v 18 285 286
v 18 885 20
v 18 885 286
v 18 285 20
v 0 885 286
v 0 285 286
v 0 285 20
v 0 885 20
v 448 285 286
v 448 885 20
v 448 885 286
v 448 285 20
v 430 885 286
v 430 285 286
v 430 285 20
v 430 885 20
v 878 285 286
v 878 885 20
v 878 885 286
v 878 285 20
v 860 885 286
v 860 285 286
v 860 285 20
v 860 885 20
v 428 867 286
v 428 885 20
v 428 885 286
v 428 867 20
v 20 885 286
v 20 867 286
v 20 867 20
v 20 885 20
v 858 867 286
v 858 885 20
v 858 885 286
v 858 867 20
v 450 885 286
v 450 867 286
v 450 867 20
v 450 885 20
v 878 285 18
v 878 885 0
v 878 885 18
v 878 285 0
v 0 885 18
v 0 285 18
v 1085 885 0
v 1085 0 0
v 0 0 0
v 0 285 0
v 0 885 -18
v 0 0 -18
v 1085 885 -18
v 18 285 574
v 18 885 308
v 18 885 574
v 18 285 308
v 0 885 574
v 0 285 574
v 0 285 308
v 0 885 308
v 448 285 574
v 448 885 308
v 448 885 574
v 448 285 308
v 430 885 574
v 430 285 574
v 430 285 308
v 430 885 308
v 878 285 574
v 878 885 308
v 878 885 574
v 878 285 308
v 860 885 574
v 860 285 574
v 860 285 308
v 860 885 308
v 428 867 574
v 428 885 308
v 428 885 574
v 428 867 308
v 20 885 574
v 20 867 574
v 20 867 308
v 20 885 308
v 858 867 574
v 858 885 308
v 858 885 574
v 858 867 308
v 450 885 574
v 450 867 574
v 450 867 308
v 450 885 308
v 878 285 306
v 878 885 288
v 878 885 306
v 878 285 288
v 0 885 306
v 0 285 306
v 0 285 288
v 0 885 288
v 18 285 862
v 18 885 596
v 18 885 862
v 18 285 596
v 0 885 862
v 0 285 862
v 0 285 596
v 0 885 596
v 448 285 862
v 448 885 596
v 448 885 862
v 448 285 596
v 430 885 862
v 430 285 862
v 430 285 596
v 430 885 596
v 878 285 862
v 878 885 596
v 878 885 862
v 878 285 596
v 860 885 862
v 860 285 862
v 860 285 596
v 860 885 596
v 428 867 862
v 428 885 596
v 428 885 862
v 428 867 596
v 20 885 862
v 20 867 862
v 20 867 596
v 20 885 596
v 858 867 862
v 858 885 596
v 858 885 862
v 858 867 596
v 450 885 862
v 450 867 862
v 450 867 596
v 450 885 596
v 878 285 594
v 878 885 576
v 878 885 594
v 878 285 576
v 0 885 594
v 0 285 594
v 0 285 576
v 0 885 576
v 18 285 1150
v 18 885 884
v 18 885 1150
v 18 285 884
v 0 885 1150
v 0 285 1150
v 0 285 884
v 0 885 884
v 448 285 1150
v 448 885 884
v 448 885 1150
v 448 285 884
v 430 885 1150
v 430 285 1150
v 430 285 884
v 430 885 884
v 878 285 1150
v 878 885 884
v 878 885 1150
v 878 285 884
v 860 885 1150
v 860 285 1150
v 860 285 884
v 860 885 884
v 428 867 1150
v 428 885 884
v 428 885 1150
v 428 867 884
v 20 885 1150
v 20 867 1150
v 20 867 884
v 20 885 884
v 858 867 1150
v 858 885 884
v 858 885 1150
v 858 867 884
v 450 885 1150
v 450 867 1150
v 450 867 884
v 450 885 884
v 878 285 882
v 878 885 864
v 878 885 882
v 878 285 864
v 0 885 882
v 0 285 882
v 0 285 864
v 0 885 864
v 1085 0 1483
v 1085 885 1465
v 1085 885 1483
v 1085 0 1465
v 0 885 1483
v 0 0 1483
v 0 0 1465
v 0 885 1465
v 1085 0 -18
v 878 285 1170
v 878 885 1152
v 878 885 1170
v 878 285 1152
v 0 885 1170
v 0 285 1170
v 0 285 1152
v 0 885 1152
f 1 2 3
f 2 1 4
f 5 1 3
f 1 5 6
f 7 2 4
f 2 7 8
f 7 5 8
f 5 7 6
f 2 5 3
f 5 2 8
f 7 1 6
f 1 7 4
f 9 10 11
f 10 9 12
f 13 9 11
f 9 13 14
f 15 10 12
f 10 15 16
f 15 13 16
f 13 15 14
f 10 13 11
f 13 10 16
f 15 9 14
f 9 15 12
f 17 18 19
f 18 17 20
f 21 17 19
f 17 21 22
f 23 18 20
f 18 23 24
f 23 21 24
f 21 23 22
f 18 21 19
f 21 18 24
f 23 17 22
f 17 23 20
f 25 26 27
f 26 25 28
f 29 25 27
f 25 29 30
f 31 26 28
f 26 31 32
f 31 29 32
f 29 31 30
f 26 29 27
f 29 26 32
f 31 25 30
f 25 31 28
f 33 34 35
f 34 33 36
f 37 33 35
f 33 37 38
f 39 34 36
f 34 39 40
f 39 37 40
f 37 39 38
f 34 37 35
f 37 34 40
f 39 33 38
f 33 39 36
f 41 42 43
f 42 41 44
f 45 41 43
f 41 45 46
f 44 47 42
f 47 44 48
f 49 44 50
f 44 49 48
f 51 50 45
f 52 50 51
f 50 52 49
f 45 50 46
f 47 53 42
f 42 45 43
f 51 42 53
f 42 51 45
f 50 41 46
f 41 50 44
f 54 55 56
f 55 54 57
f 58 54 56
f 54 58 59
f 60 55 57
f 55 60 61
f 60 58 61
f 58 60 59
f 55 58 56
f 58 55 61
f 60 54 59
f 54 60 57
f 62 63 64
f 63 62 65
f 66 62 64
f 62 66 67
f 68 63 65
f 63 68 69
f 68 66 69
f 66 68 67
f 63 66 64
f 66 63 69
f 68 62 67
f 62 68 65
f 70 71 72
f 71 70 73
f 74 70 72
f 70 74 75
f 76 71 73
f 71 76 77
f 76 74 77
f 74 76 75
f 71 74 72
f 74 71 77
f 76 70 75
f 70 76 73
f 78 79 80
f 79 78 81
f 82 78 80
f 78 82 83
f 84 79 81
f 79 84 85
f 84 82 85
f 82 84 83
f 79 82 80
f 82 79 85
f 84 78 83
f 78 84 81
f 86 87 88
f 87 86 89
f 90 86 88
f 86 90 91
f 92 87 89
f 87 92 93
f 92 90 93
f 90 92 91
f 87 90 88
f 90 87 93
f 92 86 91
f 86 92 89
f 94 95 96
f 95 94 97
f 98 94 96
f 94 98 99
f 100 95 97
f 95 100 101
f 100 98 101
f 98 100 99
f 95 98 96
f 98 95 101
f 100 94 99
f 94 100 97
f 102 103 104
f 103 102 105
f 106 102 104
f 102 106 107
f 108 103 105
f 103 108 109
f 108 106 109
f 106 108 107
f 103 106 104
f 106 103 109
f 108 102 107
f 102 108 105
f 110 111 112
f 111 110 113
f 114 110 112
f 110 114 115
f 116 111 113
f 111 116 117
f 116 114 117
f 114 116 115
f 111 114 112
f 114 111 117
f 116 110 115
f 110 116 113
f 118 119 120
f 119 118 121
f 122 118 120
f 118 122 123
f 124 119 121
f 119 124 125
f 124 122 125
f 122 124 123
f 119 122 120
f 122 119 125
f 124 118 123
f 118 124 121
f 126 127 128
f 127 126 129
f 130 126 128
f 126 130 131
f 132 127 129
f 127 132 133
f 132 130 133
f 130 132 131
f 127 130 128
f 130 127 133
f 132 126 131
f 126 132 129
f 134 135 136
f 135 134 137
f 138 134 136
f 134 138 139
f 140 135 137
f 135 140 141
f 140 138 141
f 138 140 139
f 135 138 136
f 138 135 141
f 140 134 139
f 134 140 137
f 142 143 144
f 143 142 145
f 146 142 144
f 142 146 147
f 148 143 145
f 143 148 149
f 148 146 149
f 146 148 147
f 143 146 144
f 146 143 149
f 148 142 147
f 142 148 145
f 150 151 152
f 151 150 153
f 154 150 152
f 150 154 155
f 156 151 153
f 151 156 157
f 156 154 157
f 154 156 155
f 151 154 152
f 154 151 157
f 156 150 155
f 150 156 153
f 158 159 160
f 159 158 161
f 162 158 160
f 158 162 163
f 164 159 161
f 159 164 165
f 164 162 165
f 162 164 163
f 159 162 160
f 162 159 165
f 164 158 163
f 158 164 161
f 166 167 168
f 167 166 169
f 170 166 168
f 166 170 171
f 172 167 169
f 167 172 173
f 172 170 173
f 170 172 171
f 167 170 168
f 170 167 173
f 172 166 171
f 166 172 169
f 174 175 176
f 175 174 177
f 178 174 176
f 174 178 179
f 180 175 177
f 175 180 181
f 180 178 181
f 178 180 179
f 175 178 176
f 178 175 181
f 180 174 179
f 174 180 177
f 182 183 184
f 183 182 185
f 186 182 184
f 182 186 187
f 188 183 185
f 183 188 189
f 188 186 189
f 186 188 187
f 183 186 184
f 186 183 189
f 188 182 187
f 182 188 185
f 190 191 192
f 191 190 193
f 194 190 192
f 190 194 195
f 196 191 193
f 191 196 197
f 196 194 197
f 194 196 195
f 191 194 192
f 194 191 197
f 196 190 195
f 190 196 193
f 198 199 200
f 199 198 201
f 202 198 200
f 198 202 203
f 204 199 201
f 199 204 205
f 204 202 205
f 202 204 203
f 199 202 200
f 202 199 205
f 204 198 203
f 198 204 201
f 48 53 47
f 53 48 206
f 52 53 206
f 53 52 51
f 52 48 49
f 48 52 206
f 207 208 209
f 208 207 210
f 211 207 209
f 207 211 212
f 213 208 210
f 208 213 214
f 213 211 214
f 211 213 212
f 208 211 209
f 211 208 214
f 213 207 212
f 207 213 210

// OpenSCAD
/*

Cat climbing wall - wall bracket jig
@idnorton
2021-10-23

Licenced as Creative Commons Attribution Non Commercial 3.0
See https://creativecommons.org/licenses/by-nc/3.0/

Specifically you may not sell the design or products using the design.
You're welcome to use the design to build these for your own use :)

*/


// Board thickness and saw kerf
thickness = 18;
kerf = 2;

// Overall size of cupboard
x_size = 1085;
y_size = 885;
z_size = 1465;

// top & bottom of the cupboard
translate([0, 0, z_size]) {top_bottom(x_size, y_size, thickness);};
translate([0, 0, -thickness]) {top_bottom(x_size, y_size, thickness);};

// Box size
x_box = 412;
y_box = 600;
z_box = 270;

boxes_wide = 2;
boxes_high = 3;

for ( i = [ 0 : 1 : boxes_high ] ) {
    translate([0, y_size - y_box, (i * (z_box + thickness))]) {
        shelf();
    }
}

module shelf () {

    // bottom of shelf
    cube([
        (thickness + (boxes_wide * (x_box + thickness))),
        y_box,
        thickness
    ]);


    for ( i = [ 0 : 1 : boxes_wide ] ) {

        x = (i * (x_box + thickness));
        //echo("Vertical position:");
        //echo(x);

        // Vertical front to back
        translate([
            x,
            0,
            thickness + kerf
        ]) {
            cube([
                thickness,
                y_box,
                z_box - (2 * kerf)
            ]);
        }
    }

    for ( i = [ 0 : 1 : boxes_wide - 1 ] ) {

        x = thickness + kerf + (i * (x_box + thickness));
        //echo("Back panel position: ");
        //echo(x);

        // Back panel
        translate([
            x,
            y_box - thickness,
            thickness + kerf
        ]) {
            cube([
                x_box - (2*kerf),
                thickness,
                z_box - (2*kerf)
            ]);
        }
    }
}

// top of shelf
translate([0, y_size - y_box, ((boxes_high + 1) * (z_box + thickness))]) {
    cube([
        ((x_box + thickness) * boxes_wide) + thickness,
        y_box,
        thickness
    ]);
}

module top_bottom (x, y, thickness) {
    color("green") {
        cube(size = [x, y, thickness]);
    }
}
